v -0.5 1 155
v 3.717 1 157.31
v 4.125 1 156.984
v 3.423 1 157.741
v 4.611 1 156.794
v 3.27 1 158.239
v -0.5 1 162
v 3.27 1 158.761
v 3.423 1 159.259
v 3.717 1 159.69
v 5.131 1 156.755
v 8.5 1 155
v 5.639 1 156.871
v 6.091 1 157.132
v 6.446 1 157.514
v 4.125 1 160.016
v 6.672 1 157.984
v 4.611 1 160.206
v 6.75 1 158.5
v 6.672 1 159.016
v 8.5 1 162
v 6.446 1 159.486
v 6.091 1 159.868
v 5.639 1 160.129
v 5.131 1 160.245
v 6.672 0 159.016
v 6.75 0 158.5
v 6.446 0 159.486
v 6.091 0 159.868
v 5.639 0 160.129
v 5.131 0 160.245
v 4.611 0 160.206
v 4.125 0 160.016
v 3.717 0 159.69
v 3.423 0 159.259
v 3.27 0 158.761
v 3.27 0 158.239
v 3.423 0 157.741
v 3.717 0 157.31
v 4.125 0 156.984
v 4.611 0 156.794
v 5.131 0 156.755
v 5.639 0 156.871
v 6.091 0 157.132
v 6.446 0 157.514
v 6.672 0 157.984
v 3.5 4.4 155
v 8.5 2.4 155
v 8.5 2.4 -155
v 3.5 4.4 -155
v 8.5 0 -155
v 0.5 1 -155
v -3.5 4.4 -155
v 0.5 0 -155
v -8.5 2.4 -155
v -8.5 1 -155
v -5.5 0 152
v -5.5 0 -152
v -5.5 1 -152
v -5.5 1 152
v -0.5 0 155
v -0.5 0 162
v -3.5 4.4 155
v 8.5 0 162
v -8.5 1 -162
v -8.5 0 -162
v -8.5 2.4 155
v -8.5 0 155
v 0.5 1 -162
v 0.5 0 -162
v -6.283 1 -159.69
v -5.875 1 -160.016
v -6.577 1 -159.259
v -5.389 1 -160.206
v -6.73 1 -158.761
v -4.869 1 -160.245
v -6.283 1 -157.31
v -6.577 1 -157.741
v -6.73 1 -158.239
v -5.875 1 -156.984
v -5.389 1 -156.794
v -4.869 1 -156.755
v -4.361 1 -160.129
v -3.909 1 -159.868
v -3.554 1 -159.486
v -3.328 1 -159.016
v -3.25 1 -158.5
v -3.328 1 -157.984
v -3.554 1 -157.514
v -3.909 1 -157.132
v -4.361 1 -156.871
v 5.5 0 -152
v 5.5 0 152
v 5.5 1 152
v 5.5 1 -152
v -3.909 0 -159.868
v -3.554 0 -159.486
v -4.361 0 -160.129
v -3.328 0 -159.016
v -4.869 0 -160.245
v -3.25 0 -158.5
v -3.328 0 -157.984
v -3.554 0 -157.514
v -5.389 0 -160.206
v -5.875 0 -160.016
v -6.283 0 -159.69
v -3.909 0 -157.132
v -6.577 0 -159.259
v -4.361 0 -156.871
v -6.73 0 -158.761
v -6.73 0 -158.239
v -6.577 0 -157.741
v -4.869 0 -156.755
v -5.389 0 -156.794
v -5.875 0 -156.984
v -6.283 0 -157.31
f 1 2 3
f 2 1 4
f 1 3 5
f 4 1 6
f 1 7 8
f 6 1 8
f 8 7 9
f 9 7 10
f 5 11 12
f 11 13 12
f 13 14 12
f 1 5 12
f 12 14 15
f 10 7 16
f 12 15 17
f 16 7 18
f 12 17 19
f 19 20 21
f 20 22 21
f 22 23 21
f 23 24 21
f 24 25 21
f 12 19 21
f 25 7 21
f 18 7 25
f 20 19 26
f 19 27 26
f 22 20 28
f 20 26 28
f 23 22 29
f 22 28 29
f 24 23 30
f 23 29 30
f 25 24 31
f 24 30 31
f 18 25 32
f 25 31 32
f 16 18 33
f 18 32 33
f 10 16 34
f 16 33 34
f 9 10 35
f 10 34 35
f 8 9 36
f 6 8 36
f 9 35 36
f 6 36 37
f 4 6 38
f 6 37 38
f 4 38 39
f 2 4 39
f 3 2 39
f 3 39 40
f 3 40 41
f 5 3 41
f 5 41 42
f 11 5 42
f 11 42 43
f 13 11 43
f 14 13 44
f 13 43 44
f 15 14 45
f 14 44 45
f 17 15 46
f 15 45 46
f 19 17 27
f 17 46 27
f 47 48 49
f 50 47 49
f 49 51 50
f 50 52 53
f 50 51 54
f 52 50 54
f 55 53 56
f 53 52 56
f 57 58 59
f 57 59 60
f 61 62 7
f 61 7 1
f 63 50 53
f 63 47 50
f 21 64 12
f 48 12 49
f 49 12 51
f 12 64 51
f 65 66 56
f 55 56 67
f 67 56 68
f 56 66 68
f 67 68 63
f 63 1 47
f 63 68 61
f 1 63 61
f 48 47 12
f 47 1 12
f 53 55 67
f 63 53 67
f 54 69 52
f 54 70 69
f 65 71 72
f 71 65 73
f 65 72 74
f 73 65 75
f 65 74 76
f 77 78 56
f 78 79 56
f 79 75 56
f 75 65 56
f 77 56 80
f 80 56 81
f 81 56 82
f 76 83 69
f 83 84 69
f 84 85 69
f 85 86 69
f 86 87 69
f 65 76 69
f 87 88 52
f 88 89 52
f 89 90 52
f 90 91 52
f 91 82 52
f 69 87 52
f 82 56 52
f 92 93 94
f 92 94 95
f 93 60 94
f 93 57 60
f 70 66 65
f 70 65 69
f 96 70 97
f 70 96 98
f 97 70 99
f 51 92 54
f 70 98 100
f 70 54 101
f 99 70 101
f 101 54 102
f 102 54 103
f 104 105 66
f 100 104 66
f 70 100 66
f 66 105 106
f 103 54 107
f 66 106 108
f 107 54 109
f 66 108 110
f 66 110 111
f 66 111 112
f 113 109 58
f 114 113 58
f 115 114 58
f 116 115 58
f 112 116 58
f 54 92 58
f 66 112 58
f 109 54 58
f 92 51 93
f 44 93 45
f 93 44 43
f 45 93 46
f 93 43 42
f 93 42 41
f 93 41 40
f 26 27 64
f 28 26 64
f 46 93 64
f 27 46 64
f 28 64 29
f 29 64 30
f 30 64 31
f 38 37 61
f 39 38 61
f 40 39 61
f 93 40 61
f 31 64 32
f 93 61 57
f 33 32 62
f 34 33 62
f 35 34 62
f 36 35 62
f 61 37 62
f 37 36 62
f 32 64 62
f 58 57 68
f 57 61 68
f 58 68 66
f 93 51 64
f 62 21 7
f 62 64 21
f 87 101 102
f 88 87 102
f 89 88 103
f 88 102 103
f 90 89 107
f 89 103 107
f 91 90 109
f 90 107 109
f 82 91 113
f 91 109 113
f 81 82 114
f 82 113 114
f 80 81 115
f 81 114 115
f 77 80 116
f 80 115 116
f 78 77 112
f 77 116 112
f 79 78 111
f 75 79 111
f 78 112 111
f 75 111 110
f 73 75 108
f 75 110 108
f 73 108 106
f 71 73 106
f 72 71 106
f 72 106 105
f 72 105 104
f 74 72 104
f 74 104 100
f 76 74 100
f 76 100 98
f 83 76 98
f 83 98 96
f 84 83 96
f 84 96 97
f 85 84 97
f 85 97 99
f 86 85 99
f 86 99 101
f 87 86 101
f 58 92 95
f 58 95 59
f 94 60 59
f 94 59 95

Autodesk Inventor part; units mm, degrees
ref_plane "YZ Plane" through (0, 0, 0) normal (1, 0, 0) x (0, 1, 0)
ref_plane "XZ Plane" through (0, 0, 0) normal (0, 1, 0) x (-1, 0, 0)
ref_plane "XY Plane" through (0, 0, 0) normal (0, 0, 1) x (1, 0, 0)
sketch "Sketch1" plane through (0, 0, 0) normal (0, 1, 0) x (-1, 0, 0)
  line L0 (-8.5, -155) -> (8.5, -155)
  line L1 (8.5, -155) -> (8.5, 155)
  line L2 (8.5, 155) -> (-8.5, 155)
  line L3 (-8.5, 155) -> (-8.5, -155)
  line L4 (-8.5, -155) -> (8.5, 155) construction
  line L5 (8.5, -155) -> (-8.5, 155) construction
  point P0 (0, 0)
  dimension "d0" = 310
  dimension "d1" = 17
extrude "Extrusion1" add sketch "Sketch1" along normal blind 4.4
chamfer "Chamfer1" distance 5 distance2 2 1 edges at (8.5, 4.4, 0) measured on face at (2.8333, 4.4, 51.6667)
chamfer "Chamfer2" distance 5 distance2 2 1 edges at (-8.5, 4.4, 0) measured on face at (-4.5, 4.4, 51.6667)
sketch "Sketch2" plane through (0, 0, 0) normal (0, -1, 0) x (1, 0, 0)
  line L0 (-8.5, -155) -> (-8.5, 155) projected
  line L1 (8.5, -155) -> (-8.5, -155) projected
  line L2 (8.5, 155) -> (8.5, -155) projected
  line L3 (-8.5, 155) -> (8.5, 155) projected
  circle A0 centre (-5, -158.5) radius 1.75
  circle A1 centre (5, 158.5) radius 1.75
  line L4 (-8.5, 155) -> (8.5, 155) projected
  line L5 (8.5, 155) -> (8.5, 162)
  line L6 (8.5, 162) -> (-0.5, 162)
  line L7 (-0.5, 162) -> (-0.5, 155)
  line L8 (-8.5, -155) -> (-8.5, 155) projected
  line L9 (-8.5, -155) -> (-8.5, -162)
  line L10 (-8.5, -162) -> (0.5, -162)
  line L11 (0.5, -162) -> (0.5, -155)
  line L12 (8.5, -155) -> (-8.5, -155) projected
  point P0 (0, 0)
  dimension "d10" = 3.5
  dimension "d11" = 3.5
  dimension "d12" = 3.5
  dimension "d13" = 3.5
  dimension "d14" = 3.5
  dimension "d15" = 9
  dimension "d16" = 7
extrude "Extrusion2" add sketch "Sketch2" against normal blind 1 contours L1 L11 L10 L9 | L7 L6 L5 L3
sketch "Sketch3" plane through (0, 0, 0) normal (0, -1, 0) x (1, 0, 0)
  circle A0 centre (5, 158.5) radius 1.75 projected
  circle A1 centre (-5, -158.5) radius 1.75 projected
  line L0 (-8.5, -162) -> (-8.5, 155) projected
  line L1 (-8.5, -162) -> (0.5, -162) projected
  line L2 (0.5, -162) -> (0.5, -155) projected
  line L3 (8.5, -155) -> (0.5, -155) projected
  line L4 (8.5, -155) -> (8.5, 162) projected
  line L5 (8.5, 162) -> (-0.5, 162) projected
  line L6 (-0.5, 162) -> (-0.5, 155) projected
  line L7 (-8.5, 155) -> (-0.5, 155) projected
  line L8 (5.5, -152) -> (-5.5, -152)
  line L9 (-5.5, -152) -> (-5.5, 152)
  line L10 (-5.5, 152) -> (5.5, 152)
  line L11 (5.5, 152) -> (5.5, -152)
  line L12 (8.5, -155) -> (0.5, -155) projected
  point P0 (0, 0)
  point P1 (4.5, -155)
  dimension "d19" = 3
  dimension "d20" = 3
  dimension "d21" = 3
  dimension "d22" = 3
extrude "Extrusion3" cut sketch "Sketch3" against normal blind 1 contours L8 L9 L10 L11
equation "\"d11\" = d10"
equation "\"d13\" = d10"
equation "\"d14\" = d10"
equation "\"d16\" = 2 * d14"
equation "\"d20\" = d19"
equation "\"d21\" = d19"
equation "\"d22\" = d19"
properties part number "ZLF Alumiline 310" material "Aluminum 6061"
